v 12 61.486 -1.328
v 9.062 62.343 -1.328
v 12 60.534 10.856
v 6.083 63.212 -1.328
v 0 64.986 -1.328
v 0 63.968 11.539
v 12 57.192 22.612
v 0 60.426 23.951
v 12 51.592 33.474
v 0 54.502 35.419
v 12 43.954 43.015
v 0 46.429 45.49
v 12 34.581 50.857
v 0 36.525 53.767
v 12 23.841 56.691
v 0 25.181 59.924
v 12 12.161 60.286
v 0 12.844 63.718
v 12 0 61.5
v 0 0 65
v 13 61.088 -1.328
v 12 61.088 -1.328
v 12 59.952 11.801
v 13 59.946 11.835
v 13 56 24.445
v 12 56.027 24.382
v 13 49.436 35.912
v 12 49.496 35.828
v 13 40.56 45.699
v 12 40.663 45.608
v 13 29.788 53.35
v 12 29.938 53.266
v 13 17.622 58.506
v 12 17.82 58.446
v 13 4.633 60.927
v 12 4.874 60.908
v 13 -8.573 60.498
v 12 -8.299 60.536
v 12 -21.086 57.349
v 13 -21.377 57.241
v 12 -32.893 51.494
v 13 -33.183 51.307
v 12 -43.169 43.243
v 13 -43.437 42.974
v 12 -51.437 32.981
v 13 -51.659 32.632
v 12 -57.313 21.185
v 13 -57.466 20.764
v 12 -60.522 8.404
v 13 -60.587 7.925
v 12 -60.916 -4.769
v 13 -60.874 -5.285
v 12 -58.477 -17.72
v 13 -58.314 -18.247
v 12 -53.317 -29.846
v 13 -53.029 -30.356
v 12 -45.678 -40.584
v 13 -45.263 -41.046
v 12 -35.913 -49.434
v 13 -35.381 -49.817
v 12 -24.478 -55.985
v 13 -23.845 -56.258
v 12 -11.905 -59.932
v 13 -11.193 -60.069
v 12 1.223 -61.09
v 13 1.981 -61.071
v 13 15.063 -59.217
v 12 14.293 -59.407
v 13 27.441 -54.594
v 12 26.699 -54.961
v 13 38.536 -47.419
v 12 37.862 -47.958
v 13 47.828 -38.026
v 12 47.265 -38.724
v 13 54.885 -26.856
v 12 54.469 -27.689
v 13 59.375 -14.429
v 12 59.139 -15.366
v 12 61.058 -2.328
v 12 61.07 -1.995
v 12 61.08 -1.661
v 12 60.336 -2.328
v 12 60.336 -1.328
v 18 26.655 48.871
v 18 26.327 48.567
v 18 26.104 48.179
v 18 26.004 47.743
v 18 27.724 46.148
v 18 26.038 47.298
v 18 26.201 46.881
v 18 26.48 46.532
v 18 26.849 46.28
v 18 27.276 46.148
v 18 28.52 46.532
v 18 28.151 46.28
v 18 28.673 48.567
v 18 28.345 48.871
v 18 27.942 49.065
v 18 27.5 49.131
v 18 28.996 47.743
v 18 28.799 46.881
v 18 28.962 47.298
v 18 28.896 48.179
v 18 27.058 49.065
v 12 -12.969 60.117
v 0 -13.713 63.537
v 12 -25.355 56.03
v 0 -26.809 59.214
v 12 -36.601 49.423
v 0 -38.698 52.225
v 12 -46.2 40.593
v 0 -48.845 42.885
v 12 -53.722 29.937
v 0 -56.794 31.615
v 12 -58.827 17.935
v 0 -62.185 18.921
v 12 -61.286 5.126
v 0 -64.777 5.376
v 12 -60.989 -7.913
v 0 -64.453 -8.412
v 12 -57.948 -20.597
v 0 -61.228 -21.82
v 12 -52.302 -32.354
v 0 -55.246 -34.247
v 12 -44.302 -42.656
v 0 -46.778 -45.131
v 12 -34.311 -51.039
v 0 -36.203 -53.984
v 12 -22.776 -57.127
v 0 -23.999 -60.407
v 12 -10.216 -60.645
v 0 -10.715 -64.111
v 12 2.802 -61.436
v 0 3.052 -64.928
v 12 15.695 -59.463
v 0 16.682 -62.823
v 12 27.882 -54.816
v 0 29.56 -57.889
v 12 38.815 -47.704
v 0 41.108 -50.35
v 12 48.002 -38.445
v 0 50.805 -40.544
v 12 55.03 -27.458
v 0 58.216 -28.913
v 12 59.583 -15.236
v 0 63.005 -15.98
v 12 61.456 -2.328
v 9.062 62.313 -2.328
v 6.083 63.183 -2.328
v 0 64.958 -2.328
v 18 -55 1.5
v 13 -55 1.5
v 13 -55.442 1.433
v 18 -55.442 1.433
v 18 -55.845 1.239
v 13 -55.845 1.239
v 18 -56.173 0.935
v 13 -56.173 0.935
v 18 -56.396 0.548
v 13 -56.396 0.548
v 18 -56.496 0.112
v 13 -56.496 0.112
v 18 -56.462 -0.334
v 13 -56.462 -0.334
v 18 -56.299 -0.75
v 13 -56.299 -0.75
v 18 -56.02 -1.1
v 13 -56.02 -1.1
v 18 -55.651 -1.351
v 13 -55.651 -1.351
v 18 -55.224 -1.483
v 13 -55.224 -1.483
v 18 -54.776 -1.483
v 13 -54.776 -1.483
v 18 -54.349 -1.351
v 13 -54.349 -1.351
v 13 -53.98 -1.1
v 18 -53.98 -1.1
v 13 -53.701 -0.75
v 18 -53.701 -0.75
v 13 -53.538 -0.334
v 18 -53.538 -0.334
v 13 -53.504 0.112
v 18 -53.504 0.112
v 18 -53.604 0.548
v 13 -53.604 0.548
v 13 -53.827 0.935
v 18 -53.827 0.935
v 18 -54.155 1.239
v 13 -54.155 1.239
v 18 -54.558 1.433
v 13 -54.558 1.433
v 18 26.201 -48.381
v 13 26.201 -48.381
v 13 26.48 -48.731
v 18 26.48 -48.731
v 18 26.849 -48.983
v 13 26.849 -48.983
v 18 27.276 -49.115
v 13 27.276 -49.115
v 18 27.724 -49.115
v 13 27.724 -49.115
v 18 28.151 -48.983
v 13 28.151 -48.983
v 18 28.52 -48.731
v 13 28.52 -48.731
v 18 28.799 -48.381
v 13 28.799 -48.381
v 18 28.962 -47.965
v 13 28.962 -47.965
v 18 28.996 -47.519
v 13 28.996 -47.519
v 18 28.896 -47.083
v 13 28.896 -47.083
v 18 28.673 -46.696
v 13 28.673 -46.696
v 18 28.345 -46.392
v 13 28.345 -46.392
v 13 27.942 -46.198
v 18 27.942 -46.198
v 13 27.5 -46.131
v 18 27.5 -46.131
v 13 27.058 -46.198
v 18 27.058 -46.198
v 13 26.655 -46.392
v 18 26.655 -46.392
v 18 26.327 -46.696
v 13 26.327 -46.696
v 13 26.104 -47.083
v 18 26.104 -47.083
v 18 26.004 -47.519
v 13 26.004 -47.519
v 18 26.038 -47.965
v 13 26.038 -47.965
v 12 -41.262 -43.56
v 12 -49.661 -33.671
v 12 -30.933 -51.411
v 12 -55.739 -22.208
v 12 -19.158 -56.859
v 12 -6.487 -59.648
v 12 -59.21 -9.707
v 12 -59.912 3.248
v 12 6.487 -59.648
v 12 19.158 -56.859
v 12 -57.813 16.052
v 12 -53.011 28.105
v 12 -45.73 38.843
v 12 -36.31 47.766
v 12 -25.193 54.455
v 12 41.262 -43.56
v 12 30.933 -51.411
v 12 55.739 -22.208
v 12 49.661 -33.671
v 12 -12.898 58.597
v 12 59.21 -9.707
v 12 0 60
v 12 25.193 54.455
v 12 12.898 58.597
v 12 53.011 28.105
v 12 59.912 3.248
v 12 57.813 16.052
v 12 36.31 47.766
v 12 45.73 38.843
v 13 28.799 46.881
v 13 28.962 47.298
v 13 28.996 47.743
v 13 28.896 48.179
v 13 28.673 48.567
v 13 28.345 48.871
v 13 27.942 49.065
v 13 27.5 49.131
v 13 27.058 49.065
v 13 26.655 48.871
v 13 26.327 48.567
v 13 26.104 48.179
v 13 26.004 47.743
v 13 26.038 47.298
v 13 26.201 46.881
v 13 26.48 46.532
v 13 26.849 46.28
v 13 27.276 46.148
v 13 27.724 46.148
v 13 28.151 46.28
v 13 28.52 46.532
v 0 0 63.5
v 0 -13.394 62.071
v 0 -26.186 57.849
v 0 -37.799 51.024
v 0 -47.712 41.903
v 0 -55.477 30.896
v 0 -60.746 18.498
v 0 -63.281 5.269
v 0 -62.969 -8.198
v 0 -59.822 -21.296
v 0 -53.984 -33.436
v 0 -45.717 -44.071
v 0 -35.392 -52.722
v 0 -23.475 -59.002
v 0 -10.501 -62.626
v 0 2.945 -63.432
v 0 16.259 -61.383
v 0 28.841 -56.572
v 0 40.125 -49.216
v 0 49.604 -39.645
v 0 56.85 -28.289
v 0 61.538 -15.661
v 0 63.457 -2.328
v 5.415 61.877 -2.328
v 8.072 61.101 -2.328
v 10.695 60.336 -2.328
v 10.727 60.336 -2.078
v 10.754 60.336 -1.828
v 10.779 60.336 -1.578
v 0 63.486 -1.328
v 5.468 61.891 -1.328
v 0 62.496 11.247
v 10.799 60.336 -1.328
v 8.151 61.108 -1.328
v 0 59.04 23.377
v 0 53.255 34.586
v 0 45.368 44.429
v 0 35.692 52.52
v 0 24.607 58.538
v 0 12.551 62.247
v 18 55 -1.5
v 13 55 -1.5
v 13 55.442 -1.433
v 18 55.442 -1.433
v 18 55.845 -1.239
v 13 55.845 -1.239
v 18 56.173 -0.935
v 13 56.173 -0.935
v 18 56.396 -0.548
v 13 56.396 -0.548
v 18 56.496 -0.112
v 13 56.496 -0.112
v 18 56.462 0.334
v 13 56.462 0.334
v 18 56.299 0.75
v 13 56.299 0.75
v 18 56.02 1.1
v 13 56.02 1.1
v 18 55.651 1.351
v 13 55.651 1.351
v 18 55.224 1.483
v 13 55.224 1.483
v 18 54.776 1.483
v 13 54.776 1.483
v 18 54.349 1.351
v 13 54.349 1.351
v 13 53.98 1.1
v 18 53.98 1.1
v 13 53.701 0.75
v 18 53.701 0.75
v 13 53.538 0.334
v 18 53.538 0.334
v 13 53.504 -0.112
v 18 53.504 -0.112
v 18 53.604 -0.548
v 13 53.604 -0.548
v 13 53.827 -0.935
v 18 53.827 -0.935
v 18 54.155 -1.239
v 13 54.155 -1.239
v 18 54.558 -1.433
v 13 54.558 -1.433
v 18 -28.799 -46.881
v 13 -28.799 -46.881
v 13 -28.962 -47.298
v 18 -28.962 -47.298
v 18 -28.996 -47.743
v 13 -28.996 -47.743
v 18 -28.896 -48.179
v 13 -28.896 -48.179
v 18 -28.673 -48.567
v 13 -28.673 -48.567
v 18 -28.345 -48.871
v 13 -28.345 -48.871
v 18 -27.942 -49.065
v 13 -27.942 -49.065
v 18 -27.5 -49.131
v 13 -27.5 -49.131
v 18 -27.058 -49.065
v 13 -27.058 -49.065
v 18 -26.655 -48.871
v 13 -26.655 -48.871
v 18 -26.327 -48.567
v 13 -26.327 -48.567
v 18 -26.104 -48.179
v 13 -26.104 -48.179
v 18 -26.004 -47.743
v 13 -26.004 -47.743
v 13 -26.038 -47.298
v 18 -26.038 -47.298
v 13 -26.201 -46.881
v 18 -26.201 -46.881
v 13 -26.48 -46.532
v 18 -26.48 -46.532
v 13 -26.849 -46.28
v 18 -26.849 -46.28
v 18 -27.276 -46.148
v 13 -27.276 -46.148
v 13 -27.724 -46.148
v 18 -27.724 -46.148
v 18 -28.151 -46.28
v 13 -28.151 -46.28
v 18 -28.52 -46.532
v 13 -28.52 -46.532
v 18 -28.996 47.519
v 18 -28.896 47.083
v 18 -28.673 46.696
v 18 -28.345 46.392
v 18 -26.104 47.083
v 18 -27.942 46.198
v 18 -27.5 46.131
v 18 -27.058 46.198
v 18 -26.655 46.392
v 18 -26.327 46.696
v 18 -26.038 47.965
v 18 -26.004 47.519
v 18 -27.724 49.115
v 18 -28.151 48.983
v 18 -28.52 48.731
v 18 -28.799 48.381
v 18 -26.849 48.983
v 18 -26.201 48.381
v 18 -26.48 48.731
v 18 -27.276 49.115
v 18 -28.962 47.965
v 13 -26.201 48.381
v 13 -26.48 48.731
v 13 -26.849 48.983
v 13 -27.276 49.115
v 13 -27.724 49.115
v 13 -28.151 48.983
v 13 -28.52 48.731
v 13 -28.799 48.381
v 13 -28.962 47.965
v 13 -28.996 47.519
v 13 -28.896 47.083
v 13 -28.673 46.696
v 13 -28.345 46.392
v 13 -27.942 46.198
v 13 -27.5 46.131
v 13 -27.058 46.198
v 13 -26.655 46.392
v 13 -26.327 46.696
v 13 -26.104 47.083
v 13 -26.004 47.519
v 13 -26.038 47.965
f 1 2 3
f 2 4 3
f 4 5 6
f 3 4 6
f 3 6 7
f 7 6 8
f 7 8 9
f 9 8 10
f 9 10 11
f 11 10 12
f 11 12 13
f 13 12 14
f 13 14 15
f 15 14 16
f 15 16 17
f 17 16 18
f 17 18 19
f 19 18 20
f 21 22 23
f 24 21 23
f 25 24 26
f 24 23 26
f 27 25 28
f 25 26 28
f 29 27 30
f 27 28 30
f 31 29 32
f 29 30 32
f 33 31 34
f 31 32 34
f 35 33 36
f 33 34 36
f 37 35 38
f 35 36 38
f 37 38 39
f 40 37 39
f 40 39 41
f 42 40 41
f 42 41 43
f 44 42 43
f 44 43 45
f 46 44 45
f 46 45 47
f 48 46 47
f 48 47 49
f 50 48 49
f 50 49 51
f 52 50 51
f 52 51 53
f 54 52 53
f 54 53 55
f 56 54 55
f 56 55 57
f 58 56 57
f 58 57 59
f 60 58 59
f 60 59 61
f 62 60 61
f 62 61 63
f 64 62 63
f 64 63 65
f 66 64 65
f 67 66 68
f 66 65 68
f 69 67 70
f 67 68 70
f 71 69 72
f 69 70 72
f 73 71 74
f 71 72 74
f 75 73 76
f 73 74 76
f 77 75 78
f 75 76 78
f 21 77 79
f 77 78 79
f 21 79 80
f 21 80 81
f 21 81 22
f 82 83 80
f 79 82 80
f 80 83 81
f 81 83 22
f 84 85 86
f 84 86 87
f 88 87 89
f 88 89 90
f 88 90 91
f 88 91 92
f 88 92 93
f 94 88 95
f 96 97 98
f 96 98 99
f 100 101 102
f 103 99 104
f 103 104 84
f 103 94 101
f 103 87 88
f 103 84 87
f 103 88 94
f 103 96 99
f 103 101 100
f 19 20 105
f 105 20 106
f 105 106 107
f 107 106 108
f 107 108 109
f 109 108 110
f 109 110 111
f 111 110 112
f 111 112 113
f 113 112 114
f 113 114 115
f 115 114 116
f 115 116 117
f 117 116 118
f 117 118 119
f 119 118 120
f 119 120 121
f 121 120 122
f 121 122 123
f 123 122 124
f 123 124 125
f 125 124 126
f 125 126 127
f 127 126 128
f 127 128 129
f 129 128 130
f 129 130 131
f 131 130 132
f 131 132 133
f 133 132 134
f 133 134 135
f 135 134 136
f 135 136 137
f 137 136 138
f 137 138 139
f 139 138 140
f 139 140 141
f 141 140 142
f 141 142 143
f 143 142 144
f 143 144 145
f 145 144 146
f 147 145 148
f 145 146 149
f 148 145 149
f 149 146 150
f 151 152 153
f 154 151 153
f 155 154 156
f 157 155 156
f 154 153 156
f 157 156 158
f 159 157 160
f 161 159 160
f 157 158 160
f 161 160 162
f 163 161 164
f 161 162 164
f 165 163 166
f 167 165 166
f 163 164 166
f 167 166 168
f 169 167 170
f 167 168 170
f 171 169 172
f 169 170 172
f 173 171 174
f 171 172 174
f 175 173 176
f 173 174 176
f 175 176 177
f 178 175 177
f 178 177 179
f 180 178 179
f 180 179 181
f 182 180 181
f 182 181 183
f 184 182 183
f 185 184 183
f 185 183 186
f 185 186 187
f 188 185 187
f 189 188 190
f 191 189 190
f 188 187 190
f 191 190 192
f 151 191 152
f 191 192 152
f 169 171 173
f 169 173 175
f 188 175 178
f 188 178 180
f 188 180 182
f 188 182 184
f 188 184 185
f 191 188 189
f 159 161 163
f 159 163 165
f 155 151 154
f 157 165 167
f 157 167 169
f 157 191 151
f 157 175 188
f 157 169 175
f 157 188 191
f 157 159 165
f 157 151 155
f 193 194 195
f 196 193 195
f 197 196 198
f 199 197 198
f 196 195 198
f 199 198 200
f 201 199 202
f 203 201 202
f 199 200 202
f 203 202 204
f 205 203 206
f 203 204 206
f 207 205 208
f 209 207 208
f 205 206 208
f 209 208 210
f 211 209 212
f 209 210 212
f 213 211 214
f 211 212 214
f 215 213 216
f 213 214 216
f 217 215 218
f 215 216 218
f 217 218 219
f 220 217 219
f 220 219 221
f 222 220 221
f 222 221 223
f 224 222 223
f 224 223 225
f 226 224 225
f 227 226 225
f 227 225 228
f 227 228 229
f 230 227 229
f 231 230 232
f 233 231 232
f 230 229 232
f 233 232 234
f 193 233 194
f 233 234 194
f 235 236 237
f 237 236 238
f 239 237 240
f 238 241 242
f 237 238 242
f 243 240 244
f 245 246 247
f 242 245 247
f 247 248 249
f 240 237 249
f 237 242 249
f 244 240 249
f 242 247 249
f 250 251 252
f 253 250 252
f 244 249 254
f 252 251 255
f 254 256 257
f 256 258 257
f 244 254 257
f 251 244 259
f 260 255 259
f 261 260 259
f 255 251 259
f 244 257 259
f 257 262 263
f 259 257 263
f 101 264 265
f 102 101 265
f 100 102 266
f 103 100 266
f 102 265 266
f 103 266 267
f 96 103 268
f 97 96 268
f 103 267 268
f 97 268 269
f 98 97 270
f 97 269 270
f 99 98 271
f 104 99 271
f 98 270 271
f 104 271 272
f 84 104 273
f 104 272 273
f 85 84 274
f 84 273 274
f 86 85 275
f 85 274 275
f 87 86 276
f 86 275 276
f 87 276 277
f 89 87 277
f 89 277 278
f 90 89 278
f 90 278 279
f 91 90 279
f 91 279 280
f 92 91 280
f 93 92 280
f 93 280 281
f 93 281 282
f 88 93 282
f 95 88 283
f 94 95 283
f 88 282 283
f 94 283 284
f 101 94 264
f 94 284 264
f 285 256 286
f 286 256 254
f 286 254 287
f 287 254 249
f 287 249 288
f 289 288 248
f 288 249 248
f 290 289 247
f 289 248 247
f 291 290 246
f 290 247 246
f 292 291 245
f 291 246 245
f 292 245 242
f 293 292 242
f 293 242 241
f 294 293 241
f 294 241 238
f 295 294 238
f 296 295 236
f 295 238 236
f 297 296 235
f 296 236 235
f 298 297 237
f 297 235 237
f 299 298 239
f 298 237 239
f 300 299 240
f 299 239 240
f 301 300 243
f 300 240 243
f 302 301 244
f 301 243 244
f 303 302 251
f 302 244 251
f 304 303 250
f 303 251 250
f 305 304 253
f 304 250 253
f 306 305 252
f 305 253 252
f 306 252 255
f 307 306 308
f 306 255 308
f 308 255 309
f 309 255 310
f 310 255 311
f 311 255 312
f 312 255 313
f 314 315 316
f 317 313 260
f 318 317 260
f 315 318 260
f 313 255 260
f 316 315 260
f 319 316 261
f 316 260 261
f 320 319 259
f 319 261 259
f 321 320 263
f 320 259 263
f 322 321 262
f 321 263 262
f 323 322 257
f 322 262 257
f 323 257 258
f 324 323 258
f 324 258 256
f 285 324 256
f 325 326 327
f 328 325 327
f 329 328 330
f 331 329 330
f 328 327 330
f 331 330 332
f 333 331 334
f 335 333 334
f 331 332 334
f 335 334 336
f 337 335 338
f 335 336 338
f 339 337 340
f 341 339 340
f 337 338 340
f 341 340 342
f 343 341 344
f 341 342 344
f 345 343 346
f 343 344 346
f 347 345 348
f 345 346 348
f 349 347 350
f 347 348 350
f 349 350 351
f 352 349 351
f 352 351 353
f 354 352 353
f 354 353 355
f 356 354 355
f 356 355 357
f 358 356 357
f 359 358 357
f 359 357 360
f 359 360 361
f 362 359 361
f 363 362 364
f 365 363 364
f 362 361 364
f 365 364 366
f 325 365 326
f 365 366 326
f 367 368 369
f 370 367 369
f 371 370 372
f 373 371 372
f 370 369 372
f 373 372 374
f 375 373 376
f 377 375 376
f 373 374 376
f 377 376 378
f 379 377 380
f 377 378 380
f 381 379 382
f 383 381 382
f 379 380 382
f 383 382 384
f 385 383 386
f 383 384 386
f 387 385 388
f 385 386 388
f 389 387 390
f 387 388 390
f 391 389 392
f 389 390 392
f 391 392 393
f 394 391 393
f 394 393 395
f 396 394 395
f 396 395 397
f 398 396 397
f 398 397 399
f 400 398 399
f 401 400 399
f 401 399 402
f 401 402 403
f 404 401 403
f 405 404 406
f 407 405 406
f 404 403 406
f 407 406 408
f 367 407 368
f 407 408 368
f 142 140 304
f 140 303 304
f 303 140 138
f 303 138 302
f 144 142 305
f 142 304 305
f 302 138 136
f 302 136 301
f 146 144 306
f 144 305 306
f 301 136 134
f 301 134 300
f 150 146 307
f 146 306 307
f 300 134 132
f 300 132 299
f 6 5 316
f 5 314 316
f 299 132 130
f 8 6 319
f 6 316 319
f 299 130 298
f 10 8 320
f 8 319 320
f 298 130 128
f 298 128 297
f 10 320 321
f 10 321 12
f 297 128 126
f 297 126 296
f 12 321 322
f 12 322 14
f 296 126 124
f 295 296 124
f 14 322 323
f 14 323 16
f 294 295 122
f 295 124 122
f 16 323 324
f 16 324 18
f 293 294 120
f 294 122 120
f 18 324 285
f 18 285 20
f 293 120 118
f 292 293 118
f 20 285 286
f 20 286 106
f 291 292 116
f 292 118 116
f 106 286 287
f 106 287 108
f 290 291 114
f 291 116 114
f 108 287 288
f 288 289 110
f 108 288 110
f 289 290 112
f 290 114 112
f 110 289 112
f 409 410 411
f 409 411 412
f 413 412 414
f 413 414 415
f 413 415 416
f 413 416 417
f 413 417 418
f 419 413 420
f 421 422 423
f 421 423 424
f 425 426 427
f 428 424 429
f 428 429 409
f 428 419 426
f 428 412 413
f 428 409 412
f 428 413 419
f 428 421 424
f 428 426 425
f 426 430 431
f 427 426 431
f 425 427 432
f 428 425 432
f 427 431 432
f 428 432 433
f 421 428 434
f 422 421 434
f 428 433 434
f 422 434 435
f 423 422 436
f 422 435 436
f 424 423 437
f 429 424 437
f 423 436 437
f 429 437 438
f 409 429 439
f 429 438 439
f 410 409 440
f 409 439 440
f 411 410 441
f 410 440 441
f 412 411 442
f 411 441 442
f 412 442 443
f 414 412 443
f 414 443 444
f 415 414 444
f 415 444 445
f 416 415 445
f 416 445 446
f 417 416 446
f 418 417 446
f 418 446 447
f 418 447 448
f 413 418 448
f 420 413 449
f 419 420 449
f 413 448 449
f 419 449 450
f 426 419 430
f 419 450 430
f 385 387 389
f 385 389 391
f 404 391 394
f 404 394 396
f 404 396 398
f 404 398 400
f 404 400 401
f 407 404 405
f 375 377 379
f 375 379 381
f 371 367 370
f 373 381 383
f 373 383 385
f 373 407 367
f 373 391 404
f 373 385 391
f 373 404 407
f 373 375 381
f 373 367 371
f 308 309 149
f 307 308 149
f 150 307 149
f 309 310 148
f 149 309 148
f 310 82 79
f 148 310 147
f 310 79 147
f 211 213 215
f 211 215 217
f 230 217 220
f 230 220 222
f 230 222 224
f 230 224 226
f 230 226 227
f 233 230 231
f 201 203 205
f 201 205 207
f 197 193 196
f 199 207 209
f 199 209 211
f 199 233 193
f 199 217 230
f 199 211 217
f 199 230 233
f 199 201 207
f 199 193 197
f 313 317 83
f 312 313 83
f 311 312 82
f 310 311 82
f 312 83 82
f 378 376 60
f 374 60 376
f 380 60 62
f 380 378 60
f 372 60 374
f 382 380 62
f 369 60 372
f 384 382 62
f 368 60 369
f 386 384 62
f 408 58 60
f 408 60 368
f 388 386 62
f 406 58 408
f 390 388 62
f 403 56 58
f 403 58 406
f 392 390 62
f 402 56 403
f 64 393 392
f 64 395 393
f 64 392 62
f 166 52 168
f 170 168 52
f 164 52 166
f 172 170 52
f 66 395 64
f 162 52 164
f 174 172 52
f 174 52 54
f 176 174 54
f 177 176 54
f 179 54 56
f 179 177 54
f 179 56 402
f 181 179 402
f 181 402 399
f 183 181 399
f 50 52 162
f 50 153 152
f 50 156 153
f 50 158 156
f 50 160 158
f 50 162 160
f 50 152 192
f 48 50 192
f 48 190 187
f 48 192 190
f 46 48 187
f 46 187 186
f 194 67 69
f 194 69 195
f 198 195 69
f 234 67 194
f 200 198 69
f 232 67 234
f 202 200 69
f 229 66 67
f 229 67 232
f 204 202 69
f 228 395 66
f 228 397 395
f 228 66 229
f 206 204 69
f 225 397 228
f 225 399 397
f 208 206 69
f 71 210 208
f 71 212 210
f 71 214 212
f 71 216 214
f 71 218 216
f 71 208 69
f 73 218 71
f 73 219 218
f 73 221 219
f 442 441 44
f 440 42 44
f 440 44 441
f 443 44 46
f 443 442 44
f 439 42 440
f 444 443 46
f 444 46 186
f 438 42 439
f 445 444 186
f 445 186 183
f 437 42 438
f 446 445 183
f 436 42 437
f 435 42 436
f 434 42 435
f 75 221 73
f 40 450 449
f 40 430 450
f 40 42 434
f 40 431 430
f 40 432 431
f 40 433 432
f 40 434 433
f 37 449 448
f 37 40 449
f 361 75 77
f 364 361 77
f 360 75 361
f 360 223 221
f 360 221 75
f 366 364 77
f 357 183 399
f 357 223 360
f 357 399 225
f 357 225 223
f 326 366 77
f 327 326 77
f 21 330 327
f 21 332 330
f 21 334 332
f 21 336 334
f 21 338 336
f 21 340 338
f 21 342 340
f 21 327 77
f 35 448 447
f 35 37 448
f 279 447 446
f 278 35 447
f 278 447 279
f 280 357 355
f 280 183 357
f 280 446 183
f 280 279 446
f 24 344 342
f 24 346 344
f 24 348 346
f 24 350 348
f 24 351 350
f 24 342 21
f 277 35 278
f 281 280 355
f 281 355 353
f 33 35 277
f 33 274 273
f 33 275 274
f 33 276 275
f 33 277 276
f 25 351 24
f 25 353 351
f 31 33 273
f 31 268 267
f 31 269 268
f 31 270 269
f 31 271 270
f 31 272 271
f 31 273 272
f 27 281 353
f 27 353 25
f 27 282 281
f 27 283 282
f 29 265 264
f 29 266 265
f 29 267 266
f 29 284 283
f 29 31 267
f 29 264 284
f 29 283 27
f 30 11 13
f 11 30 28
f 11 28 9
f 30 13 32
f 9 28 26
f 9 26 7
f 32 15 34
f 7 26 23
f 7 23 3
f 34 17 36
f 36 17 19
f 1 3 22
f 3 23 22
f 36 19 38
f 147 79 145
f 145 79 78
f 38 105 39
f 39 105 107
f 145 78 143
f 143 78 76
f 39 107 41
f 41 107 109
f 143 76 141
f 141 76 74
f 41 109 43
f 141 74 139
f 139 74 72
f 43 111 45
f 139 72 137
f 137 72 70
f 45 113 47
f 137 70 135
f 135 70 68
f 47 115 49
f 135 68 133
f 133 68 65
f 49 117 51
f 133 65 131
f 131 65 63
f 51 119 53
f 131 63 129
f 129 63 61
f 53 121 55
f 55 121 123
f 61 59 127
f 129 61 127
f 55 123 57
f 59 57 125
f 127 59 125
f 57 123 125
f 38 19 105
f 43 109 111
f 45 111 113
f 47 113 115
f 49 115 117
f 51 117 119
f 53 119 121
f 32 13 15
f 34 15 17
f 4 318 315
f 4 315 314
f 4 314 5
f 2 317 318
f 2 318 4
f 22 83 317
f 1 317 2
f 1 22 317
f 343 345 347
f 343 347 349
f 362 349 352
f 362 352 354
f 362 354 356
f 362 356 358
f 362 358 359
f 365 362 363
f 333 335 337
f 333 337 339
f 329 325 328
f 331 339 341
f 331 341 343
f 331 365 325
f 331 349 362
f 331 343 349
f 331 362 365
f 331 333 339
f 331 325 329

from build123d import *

# Parameters (mm, degrees)
CUT_EXTRUDE1_REACH  = 94.704
SKETCH3_W           = 1
SKETCH3_H           = 9
SKETCH7_R           = 61.102685311
BOSS_EXTRUDE1_DEPTH = 1
SKETCH8_R           = 1.5
BOSS_EXTRUDE2_DEPTH = 5
CIRPATTERN1_COUNT   = 6


with BuildPart() as part:
    # Sketch2 → Revolve1 (revolve)
    with BuildSketch(Plane.XY, mode=Mode.PRIVATE) as revolve1_sk:
        Polygon((0, 65), (0, 63.5), (12, 60), (12, 61.5), align=None)
    revolve(revolve1_sk.sketch.rotate(Axis((0, 0, 0), (1, 0, 0)), 90), axis=Axis((0, 0, 0), (1, 0, 0)))

    # Cut-Extrude1: up to this face of the body (flat: up to its plane)
    cut_extrude1_end = Plane(part.part.faces().sort_by_distance((0, 0, -64.816152237))[0])
    # Sketch3 → Cut-Extrude1 (cut, up to the picked face)
    with BuildSketch(Plane(origin=(12, 0, 0), x_dir=(0, 0, -1), z_dir=(1, 0, 0)), mode=Mode.PRIVATE) as cut_extrude1_sk1:
        with Locations((1.827954501, 64.835601496)):
            Rectangle(SKETCH3_W, SKETCH3_H)
    cut_extrude1_tool1 = split(extrude(cut_extrude1_sk1.sketch, amount=-CUT_EXTRUDE1_REACH, mode=Mode.PRIVATE), bisect_by=cut_extrude1_end, keep=Keep.BOTH, mode=Mode.PRIVATE)
    add(cut_extrude1_tool1.solids().sort_by(Axis((12, 64.835601, -1.827955), (-1, 0, 0)))[0], mode=Mode.SUBTRACT)

    # Sketch7 → Boss-Extrude1 (add)
    with BuildSketch(Plane(origin=(12, 0, 0), x_dir=(0, 0, -1), z_dir=(1, 0, 0))):
        with Locations(Location((0, 0, 0), (0, 0, 88.754683549))):
            Circle(SKETCH7_R)
    extrude(amount=BOSS_EXTRUDE1_DEPTH)

    # Sketch8 → Boss-Extrude2 (add)
    with BuildSketch(Plane(origin=(13, 0, 0), x_dir=(0, 0, -1), z_dir=(1, 0, 0))):
        with Locations((0, 55)):
            Circle(SKETCH8_R)
    boss_extrude2 = extrude(amount=BOSS_EXTRUDE2_DEPTH)

    # CirPattern1: Boss-Extrude2 ×6 about axis
    cirpattern1_axis = Axis((0, 0, 0), (1, 0, 0))
    for i in range(1, CIRPATTERN1_COUNT):
        add(boss_extrude2.rotate(cirpattern1_axis, i * 360 / CIRPATTERN1_COUNT))


solid = part.part
